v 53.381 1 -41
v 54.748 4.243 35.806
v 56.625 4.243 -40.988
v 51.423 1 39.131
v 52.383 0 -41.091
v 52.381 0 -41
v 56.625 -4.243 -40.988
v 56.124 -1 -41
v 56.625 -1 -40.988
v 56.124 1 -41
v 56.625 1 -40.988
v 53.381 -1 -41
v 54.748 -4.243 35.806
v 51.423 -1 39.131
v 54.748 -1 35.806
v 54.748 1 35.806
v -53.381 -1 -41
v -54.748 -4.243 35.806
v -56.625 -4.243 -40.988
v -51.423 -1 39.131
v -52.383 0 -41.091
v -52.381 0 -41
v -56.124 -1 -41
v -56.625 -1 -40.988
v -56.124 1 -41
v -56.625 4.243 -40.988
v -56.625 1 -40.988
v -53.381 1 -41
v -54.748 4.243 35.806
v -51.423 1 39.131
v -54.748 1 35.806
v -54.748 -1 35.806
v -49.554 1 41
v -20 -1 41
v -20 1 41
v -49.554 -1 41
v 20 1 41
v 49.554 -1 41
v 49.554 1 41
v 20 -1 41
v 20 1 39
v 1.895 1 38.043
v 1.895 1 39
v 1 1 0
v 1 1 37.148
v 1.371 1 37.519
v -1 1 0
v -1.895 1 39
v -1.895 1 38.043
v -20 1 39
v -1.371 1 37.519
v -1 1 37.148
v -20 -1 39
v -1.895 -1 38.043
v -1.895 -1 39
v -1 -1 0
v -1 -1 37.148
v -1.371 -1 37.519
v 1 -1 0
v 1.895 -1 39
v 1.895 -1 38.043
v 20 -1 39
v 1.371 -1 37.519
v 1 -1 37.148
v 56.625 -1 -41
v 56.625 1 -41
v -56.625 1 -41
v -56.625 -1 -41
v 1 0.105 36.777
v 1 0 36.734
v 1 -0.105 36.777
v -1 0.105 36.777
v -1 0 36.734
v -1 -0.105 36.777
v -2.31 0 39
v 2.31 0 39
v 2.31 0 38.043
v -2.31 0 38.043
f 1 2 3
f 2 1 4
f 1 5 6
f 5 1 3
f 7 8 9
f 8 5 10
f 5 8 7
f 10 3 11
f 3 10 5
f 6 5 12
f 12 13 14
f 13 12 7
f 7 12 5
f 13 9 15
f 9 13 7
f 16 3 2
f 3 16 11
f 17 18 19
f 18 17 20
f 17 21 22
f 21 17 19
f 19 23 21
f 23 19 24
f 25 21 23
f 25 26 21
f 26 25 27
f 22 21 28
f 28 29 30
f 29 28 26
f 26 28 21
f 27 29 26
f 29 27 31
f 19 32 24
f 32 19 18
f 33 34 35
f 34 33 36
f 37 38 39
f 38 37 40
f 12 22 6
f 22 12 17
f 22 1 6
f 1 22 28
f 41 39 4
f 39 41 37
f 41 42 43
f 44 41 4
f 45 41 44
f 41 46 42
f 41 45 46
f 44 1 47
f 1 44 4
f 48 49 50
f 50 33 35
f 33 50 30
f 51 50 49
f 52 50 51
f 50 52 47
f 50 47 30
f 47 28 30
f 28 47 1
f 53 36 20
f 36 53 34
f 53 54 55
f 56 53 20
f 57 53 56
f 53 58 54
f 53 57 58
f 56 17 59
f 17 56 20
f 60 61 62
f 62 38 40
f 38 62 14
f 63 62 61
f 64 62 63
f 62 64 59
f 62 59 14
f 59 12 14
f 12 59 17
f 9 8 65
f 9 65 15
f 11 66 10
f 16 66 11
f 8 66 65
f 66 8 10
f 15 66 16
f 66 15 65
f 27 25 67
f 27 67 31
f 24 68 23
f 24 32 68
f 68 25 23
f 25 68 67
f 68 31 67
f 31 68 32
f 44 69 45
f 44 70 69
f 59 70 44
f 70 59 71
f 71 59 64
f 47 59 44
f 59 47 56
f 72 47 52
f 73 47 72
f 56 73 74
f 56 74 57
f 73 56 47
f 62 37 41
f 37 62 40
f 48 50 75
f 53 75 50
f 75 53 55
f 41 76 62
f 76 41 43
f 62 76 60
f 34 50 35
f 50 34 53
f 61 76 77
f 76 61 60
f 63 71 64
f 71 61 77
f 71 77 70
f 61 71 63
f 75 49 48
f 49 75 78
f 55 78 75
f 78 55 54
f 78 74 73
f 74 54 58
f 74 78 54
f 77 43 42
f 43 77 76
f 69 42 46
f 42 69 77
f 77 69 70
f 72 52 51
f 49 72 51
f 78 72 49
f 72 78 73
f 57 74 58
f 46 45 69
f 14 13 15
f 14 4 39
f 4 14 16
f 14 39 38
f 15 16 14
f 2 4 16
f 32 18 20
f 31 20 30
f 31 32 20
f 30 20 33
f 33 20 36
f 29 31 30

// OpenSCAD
// Length of the Divider ... Regular 4" Square, X-Style: 113mm was a tad loose, 114mm was too tight, 113.5 fits but is a tad tight.
$lengthAtTop = 113.25;

// Thickness of the Divider
$thickness = 2; // [2:10]

// The proportion of the total height to use for scaling.
$heightPercentage = 100; // [10:100]

// Width of the Divider Edge
$widthOfDividerEdge = 6; // [6:10]

// The Length of the Chamfer
$chamferLength = 10; // [6:14]

// Cutout Location for connecting dividers together
$cutOutLocation = 1; // [1:Bottom, -1:Top, 0:None]

// Width of the notch at the bottom of the divider
$bottomNotchWidth = 40; // [25:50]
    
{} // All Parameters Above

// Object Generation
/////////////////////////////////////////////////
GenerateDivider($lengthAtTop, $thickness, $heightPercentage, $widthOfDividerEdge, $chamferLength, $cutOutLocation, $bottomNotchWidth);

// Generate the Divider
/////////////////////////////////////////////////
module GenerateDivider(lengthAtTop, thickness, heightPercentage, widthOfDividerEdge, chamferLength, cutOutLocation, bottomNotchWidth) {

    // THe Height of the Divider
    $height = 82;

    // The height (or depth) of the notch at the bottom of the divider
    $bottomNotchHeight = 2; // [0:10]

    // Angle of the Container Sides
    $complementAngle = 1.4;
    $angle = 90 - $complementAngle;

    difference() {
        IsoTrapezoid(lengthAtTop, $height, $angle, thickness, widthOfDividerEdge);
        
        $heightProportion = heightPercentage * .01;
        
        $precentageToRemove = (1 - $heightProportion);
        
        // Cut from the Top Down
        $amountToRemoveFromTop = $height * $precentageToRemove;
        $topEdgeFromCenter = -$height / 2;
        translate([0, 0, $topEdgeFromCenter + $amountToRemoveFromTop / 2]) cube([lengthAtTop, widthOfDividerEdge * 2, $amountToRemoveFromTop], center = true);
        
        // Cutouts For Divider
        if (cutOutLocation != 0) {
            $cutOutHeight = ($height * $heightProportion) / 2;

            $bottomOfDividerFromCenter =  $height / 2;

            $zOffSetForCutout = ($bottomOfDividerFromCenter - ($cutOutHeight / 2));
            
            if(cutOutLocation == -1){
                translate([0,0, $zOffSetForCutout - $cutOutHeight])
                #cube([thickness, thickness*1.1, $cutOutHeight], center = true);
            }
            else{
                translate([0,0, $zOffSetForCutout])
                #cube([thickness, thickness*1.1, $cutOutHeight], center = true);
            }
        }
        
        // Cutouts For Divider
        //if (cutOutLocation == -1) {
         //   $cutOutHeight = ($height * $heightProportion) / 2;

         //   $bottomOfDividerFromCenter =  $height / 2;

          //  $zOffSetForCutout = ($bottomOfDividerFromCenter - ($cutOutHeight / 2));

          //  #translate([0,0, $zOffSetForCutout - $cutOutHeight])
          //      cube([thickness, thickness*1.1, $cutOutHeight], center = true);
        //}
        

        
        // Notch at bottom
        translate([0,0,(($height)/2)-($bottomNotchHeight/2)])
            cube([bottomNotchWidth, thickness*1.1, $bottomNotchHeight], center = true);
        
        // Notch for the small sphere often in the bottom of the containers
        translate([0,0,($height/2)-$bottomNotchHeight])
            sphere(d = 5);

        // Cutoffs needed for the Chamfers in the corners
        $overcutFactor = 2;
        $zHeightOfChamfer = ($height/2);
        translate([(lengthAtTop / 2), 0,$zHeightOfChamfer])
            rotate([45,0,90])
            cube([widthOfDividerEdge * $overcutFactor,  chamferLength,  chamferLength], center = true);
        
        
        translate([-(lengthAtTop / 2), 0,$zHeightOfChamfer])
            rotate([45,0,90])
            cube([widthOfDividerEdge * $overcutFactor,  chamferLength,  chamferLength], center = true);
    }
}

// Generate an Trapezoid with a tapered angle
/////////////////////////////////////////////////
module IsoTrapezoid(longEdge, height, angle, thickness, widthOfDividerEdge){
    $baseOfTriangle = height / tan(angle);
    
    cube([longEdge - ($baseOfTriangle * 2), thickness, height], center = true);

    // Render the triangle with specified angle and height
    color("red")
        translate([(longEdge/2),-thickness/2,-(height/2)])
        rotate([90,0,180])
        triangle(angle, height, thickness);

    color("blue")
        translate([-(longEdge/2),thickness/2,-(height/2)])
        rotate([90,0,0])
        triangle(angle, height, thickness);

    $halfChamferOffSet = ($height / tan($angle))/2;
    
    translate([(longEdge/2)-$halfChamferOffSet,0,0])
        rotate([$complementAngle, 0, -90])
        triangle2(widthOfDividerEdge, height);

    translate([-(longEdge/2)+$halfChamferOffSet,0,0])
        rotate([$complementAngle, 0, 90])
        triangle2(widthOfDividerEdge, height);
}

// Create the triangle module with angle and height as arguments
/////////////////////////////////////////////////
module triangle(angle, height, thickness) {
    // Calculate the base length based on the angle and height
    base_length = height / tan(angle);

    linear_extrude(thickness)
    // Create the triangle
    polygon(points=[
        [0, 0], // First vertex
        [base_length, 0], // Second vertex
        [base_length, height] // Third vertex
    ]);
}

// Create a right triangle
/////////////////////////////////////////////////
module triangle2(sizeOfBase,length){
    difference(){   
        rotate([0,0,45]){
            cube([sizeOfBase,sizeOfBase,length], center = true);
        }
        
        translate([0,sizeOfBase/2,0]){
            cube([sizeOfBase*1.5,sizeOfBase,length*1.1], center = true);
        }
    }
}
